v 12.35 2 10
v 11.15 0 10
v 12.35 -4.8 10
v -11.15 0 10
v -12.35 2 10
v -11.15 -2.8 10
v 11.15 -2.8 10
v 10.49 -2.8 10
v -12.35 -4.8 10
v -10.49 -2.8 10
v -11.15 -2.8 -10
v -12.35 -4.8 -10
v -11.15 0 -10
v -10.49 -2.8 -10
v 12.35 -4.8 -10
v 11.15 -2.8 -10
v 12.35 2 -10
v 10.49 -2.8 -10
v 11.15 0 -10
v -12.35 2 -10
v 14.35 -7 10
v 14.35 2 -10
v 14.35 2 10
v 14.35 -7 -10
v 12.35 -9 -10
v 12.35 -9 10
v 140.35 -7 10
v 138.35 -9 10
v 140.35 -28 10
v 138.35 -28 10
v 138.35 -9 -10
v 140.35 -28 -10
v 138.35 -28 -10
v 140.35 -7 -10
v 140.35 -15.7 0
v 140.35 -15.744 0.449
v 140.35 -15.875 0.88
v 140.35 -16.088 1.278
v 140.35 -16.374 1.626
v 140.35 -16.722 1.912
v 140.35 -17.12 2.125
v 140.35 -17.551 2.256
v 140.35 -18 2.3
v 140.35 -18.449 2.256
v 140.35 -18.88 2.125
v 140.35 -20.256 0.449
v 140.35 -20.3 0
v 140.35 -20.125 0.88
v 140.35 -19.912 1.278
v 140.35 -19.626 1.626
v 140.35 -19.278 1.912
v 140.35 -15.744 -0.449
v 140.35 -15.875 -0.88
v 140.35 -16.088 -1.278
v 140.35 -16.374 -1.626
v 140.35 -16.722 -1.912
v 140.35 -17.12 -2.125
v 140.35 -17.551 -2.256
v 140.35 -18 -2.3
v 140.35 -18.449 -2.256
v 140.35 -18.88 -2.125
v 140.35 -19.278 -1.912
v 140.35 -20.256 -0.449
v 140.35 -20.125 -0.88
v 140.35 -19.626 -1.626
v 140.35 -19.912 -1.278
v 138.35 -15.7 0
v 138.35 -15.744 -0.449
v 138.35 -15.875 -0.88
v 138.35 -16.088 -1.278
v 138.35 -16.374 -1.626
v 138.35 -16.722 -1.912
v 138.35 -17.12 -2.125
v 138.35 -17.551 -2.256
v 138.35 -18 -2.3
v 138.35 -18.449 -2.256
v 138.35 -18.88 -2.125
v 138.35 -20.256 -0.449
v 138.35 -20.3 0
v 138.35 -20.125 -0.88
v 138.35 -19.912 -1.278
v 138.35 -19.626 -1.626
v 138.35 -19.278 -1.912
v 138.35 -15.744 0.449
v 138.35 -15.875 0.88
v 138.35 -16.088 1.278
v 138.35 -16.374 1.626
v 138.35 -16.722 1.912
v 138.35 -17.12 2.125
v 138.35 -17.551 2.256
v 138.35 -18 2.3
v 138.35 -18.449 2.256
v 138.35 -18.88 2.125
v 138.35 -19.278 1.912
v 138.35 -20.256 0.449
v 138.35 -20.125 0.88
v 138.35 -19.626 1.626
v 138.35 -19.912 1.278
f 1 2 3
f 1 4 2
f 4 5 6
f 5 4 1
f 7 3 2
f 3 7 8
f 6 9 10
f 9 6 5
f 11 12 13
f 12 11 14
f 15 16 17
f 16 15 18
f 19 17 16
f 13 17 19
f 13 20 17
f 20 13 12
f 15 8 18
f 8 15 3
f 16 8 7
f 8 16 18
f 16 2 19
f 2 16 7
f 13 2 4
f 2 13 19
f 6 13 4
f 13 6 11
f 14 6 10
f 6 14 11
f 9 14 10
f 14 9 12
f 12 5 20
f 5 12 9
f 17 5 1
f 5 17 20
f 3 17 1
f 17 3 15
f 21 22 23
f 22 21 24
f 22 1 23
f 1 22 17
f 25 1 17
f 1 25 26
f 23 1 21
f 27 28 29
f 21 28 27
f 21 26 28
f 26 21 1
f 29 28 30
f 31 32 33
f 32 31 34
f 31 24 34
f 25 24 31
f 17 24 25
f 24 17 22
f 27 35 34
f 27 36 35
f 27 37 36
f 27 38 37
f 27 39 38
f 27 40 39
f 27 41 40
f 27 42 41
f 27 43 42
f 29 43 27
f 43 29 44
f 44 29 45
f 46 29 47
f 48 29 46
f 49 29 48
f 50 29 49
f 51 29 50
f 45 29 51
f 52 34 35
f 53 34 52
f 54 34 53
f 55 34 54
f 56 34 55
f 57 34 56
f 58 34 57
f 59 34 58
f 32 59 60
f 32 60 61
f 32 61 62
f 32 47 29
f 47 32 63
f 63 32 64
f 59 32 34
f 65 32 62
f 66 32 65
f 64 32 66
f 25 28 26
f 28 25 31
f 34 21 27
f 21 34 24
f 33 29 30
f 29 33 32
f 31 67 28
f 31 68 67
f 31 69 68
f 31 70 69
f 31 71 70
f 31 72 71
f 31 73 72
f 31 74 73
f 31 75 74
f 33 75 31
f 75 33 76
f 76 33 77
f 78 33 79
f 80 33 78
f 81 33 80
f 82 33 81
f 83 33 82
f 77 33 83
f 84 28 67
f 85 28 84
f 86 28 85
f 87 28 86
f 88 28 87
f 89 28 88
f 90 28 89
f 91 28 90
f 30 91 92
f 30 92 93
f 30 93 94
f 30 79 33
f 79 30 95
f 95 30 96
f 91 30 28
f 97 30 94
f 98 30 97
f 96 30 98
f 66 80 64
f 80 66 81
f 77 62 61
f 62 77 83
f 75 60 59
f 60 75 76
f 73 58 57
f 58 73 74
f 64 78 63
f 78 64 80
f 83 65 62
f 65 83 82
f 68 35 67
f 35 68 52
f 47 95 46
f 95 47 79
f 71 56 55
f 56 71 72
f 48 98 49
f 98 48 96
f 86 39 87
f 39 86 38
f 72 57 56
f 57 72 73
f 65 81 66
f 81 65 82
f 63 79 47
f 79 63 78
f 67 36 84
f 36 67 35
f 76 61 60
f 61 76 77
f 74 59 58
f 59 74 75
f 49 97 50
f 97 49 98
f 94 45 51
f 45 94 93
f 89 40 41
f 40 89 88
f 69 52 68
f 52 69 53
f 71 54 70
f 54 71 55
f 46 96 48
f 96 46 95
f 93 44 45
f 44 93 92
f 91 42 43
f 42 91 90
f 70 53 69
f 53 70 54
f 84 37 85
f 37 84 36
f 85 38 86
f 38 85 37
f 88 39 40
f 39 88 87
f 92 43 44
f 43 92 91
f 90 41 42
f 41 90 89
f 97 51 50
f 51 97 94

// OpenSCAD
$fn=32;
width = 20;
channel_width = 22.3;
latch_height = 2;
overhang = 0.66;
wall_thickness = 2.8;
thickness = 2;
screw_hole_radius = 2.3;
screw_hole_width = 0;
channel_depth = 16;
hook_length = 128;

outer_x = channel_width/2 + 1.2;

rotate([90,0,0])
difference() {    
union() {
  rotate([90,0,0])
  translate([0, 0, -width/2])
  linear_extrude(width)
  polygon([
    [-outer_x, -thickness],
    [-outer_x, wall_thickness + latch_height],
    [-channel_width/2 + overhang, wall_thickness],
    [-channel_width/2, wall_thickness],
    [-channel_width/2, 0],
    [channel_width/2, 0],
    [channel_width/2, wall_thickness],
    [channel_width/2 - overhang, wall_thickness],
    [outer_x, wall_thickness + latch_height],
    [outer_x, -thickness],
  ]);
  
  translate([outer_x, -width/2, -thickness])
  cube([thickness, width, channel_depth/2 + thickness]);
    
  translate([outer_x, -width/2, channel_depth/2 - thickness/2])
  cube([hook_length, width, thickness]);
  
  translate([outer_x + hook_length-thickness, -width/2, channel_depth/2])
  cube([thickness, width, width]);
}
  translate([outer_x + hook_length-thickness, 0, (channel_depth+width)/2])
  rotate([0,90,0])
  translate([0, 0, -1])
  hull() {
    translate([screw_hole_width/2, 0, 0])
    cylinder(h=thickness+2, r=screw_hole_radius);
    translate([-screw_hole_width/2, 0, 0])
    cylinder(h=thickness+2, r=screw_hole_radius);
  }
}
